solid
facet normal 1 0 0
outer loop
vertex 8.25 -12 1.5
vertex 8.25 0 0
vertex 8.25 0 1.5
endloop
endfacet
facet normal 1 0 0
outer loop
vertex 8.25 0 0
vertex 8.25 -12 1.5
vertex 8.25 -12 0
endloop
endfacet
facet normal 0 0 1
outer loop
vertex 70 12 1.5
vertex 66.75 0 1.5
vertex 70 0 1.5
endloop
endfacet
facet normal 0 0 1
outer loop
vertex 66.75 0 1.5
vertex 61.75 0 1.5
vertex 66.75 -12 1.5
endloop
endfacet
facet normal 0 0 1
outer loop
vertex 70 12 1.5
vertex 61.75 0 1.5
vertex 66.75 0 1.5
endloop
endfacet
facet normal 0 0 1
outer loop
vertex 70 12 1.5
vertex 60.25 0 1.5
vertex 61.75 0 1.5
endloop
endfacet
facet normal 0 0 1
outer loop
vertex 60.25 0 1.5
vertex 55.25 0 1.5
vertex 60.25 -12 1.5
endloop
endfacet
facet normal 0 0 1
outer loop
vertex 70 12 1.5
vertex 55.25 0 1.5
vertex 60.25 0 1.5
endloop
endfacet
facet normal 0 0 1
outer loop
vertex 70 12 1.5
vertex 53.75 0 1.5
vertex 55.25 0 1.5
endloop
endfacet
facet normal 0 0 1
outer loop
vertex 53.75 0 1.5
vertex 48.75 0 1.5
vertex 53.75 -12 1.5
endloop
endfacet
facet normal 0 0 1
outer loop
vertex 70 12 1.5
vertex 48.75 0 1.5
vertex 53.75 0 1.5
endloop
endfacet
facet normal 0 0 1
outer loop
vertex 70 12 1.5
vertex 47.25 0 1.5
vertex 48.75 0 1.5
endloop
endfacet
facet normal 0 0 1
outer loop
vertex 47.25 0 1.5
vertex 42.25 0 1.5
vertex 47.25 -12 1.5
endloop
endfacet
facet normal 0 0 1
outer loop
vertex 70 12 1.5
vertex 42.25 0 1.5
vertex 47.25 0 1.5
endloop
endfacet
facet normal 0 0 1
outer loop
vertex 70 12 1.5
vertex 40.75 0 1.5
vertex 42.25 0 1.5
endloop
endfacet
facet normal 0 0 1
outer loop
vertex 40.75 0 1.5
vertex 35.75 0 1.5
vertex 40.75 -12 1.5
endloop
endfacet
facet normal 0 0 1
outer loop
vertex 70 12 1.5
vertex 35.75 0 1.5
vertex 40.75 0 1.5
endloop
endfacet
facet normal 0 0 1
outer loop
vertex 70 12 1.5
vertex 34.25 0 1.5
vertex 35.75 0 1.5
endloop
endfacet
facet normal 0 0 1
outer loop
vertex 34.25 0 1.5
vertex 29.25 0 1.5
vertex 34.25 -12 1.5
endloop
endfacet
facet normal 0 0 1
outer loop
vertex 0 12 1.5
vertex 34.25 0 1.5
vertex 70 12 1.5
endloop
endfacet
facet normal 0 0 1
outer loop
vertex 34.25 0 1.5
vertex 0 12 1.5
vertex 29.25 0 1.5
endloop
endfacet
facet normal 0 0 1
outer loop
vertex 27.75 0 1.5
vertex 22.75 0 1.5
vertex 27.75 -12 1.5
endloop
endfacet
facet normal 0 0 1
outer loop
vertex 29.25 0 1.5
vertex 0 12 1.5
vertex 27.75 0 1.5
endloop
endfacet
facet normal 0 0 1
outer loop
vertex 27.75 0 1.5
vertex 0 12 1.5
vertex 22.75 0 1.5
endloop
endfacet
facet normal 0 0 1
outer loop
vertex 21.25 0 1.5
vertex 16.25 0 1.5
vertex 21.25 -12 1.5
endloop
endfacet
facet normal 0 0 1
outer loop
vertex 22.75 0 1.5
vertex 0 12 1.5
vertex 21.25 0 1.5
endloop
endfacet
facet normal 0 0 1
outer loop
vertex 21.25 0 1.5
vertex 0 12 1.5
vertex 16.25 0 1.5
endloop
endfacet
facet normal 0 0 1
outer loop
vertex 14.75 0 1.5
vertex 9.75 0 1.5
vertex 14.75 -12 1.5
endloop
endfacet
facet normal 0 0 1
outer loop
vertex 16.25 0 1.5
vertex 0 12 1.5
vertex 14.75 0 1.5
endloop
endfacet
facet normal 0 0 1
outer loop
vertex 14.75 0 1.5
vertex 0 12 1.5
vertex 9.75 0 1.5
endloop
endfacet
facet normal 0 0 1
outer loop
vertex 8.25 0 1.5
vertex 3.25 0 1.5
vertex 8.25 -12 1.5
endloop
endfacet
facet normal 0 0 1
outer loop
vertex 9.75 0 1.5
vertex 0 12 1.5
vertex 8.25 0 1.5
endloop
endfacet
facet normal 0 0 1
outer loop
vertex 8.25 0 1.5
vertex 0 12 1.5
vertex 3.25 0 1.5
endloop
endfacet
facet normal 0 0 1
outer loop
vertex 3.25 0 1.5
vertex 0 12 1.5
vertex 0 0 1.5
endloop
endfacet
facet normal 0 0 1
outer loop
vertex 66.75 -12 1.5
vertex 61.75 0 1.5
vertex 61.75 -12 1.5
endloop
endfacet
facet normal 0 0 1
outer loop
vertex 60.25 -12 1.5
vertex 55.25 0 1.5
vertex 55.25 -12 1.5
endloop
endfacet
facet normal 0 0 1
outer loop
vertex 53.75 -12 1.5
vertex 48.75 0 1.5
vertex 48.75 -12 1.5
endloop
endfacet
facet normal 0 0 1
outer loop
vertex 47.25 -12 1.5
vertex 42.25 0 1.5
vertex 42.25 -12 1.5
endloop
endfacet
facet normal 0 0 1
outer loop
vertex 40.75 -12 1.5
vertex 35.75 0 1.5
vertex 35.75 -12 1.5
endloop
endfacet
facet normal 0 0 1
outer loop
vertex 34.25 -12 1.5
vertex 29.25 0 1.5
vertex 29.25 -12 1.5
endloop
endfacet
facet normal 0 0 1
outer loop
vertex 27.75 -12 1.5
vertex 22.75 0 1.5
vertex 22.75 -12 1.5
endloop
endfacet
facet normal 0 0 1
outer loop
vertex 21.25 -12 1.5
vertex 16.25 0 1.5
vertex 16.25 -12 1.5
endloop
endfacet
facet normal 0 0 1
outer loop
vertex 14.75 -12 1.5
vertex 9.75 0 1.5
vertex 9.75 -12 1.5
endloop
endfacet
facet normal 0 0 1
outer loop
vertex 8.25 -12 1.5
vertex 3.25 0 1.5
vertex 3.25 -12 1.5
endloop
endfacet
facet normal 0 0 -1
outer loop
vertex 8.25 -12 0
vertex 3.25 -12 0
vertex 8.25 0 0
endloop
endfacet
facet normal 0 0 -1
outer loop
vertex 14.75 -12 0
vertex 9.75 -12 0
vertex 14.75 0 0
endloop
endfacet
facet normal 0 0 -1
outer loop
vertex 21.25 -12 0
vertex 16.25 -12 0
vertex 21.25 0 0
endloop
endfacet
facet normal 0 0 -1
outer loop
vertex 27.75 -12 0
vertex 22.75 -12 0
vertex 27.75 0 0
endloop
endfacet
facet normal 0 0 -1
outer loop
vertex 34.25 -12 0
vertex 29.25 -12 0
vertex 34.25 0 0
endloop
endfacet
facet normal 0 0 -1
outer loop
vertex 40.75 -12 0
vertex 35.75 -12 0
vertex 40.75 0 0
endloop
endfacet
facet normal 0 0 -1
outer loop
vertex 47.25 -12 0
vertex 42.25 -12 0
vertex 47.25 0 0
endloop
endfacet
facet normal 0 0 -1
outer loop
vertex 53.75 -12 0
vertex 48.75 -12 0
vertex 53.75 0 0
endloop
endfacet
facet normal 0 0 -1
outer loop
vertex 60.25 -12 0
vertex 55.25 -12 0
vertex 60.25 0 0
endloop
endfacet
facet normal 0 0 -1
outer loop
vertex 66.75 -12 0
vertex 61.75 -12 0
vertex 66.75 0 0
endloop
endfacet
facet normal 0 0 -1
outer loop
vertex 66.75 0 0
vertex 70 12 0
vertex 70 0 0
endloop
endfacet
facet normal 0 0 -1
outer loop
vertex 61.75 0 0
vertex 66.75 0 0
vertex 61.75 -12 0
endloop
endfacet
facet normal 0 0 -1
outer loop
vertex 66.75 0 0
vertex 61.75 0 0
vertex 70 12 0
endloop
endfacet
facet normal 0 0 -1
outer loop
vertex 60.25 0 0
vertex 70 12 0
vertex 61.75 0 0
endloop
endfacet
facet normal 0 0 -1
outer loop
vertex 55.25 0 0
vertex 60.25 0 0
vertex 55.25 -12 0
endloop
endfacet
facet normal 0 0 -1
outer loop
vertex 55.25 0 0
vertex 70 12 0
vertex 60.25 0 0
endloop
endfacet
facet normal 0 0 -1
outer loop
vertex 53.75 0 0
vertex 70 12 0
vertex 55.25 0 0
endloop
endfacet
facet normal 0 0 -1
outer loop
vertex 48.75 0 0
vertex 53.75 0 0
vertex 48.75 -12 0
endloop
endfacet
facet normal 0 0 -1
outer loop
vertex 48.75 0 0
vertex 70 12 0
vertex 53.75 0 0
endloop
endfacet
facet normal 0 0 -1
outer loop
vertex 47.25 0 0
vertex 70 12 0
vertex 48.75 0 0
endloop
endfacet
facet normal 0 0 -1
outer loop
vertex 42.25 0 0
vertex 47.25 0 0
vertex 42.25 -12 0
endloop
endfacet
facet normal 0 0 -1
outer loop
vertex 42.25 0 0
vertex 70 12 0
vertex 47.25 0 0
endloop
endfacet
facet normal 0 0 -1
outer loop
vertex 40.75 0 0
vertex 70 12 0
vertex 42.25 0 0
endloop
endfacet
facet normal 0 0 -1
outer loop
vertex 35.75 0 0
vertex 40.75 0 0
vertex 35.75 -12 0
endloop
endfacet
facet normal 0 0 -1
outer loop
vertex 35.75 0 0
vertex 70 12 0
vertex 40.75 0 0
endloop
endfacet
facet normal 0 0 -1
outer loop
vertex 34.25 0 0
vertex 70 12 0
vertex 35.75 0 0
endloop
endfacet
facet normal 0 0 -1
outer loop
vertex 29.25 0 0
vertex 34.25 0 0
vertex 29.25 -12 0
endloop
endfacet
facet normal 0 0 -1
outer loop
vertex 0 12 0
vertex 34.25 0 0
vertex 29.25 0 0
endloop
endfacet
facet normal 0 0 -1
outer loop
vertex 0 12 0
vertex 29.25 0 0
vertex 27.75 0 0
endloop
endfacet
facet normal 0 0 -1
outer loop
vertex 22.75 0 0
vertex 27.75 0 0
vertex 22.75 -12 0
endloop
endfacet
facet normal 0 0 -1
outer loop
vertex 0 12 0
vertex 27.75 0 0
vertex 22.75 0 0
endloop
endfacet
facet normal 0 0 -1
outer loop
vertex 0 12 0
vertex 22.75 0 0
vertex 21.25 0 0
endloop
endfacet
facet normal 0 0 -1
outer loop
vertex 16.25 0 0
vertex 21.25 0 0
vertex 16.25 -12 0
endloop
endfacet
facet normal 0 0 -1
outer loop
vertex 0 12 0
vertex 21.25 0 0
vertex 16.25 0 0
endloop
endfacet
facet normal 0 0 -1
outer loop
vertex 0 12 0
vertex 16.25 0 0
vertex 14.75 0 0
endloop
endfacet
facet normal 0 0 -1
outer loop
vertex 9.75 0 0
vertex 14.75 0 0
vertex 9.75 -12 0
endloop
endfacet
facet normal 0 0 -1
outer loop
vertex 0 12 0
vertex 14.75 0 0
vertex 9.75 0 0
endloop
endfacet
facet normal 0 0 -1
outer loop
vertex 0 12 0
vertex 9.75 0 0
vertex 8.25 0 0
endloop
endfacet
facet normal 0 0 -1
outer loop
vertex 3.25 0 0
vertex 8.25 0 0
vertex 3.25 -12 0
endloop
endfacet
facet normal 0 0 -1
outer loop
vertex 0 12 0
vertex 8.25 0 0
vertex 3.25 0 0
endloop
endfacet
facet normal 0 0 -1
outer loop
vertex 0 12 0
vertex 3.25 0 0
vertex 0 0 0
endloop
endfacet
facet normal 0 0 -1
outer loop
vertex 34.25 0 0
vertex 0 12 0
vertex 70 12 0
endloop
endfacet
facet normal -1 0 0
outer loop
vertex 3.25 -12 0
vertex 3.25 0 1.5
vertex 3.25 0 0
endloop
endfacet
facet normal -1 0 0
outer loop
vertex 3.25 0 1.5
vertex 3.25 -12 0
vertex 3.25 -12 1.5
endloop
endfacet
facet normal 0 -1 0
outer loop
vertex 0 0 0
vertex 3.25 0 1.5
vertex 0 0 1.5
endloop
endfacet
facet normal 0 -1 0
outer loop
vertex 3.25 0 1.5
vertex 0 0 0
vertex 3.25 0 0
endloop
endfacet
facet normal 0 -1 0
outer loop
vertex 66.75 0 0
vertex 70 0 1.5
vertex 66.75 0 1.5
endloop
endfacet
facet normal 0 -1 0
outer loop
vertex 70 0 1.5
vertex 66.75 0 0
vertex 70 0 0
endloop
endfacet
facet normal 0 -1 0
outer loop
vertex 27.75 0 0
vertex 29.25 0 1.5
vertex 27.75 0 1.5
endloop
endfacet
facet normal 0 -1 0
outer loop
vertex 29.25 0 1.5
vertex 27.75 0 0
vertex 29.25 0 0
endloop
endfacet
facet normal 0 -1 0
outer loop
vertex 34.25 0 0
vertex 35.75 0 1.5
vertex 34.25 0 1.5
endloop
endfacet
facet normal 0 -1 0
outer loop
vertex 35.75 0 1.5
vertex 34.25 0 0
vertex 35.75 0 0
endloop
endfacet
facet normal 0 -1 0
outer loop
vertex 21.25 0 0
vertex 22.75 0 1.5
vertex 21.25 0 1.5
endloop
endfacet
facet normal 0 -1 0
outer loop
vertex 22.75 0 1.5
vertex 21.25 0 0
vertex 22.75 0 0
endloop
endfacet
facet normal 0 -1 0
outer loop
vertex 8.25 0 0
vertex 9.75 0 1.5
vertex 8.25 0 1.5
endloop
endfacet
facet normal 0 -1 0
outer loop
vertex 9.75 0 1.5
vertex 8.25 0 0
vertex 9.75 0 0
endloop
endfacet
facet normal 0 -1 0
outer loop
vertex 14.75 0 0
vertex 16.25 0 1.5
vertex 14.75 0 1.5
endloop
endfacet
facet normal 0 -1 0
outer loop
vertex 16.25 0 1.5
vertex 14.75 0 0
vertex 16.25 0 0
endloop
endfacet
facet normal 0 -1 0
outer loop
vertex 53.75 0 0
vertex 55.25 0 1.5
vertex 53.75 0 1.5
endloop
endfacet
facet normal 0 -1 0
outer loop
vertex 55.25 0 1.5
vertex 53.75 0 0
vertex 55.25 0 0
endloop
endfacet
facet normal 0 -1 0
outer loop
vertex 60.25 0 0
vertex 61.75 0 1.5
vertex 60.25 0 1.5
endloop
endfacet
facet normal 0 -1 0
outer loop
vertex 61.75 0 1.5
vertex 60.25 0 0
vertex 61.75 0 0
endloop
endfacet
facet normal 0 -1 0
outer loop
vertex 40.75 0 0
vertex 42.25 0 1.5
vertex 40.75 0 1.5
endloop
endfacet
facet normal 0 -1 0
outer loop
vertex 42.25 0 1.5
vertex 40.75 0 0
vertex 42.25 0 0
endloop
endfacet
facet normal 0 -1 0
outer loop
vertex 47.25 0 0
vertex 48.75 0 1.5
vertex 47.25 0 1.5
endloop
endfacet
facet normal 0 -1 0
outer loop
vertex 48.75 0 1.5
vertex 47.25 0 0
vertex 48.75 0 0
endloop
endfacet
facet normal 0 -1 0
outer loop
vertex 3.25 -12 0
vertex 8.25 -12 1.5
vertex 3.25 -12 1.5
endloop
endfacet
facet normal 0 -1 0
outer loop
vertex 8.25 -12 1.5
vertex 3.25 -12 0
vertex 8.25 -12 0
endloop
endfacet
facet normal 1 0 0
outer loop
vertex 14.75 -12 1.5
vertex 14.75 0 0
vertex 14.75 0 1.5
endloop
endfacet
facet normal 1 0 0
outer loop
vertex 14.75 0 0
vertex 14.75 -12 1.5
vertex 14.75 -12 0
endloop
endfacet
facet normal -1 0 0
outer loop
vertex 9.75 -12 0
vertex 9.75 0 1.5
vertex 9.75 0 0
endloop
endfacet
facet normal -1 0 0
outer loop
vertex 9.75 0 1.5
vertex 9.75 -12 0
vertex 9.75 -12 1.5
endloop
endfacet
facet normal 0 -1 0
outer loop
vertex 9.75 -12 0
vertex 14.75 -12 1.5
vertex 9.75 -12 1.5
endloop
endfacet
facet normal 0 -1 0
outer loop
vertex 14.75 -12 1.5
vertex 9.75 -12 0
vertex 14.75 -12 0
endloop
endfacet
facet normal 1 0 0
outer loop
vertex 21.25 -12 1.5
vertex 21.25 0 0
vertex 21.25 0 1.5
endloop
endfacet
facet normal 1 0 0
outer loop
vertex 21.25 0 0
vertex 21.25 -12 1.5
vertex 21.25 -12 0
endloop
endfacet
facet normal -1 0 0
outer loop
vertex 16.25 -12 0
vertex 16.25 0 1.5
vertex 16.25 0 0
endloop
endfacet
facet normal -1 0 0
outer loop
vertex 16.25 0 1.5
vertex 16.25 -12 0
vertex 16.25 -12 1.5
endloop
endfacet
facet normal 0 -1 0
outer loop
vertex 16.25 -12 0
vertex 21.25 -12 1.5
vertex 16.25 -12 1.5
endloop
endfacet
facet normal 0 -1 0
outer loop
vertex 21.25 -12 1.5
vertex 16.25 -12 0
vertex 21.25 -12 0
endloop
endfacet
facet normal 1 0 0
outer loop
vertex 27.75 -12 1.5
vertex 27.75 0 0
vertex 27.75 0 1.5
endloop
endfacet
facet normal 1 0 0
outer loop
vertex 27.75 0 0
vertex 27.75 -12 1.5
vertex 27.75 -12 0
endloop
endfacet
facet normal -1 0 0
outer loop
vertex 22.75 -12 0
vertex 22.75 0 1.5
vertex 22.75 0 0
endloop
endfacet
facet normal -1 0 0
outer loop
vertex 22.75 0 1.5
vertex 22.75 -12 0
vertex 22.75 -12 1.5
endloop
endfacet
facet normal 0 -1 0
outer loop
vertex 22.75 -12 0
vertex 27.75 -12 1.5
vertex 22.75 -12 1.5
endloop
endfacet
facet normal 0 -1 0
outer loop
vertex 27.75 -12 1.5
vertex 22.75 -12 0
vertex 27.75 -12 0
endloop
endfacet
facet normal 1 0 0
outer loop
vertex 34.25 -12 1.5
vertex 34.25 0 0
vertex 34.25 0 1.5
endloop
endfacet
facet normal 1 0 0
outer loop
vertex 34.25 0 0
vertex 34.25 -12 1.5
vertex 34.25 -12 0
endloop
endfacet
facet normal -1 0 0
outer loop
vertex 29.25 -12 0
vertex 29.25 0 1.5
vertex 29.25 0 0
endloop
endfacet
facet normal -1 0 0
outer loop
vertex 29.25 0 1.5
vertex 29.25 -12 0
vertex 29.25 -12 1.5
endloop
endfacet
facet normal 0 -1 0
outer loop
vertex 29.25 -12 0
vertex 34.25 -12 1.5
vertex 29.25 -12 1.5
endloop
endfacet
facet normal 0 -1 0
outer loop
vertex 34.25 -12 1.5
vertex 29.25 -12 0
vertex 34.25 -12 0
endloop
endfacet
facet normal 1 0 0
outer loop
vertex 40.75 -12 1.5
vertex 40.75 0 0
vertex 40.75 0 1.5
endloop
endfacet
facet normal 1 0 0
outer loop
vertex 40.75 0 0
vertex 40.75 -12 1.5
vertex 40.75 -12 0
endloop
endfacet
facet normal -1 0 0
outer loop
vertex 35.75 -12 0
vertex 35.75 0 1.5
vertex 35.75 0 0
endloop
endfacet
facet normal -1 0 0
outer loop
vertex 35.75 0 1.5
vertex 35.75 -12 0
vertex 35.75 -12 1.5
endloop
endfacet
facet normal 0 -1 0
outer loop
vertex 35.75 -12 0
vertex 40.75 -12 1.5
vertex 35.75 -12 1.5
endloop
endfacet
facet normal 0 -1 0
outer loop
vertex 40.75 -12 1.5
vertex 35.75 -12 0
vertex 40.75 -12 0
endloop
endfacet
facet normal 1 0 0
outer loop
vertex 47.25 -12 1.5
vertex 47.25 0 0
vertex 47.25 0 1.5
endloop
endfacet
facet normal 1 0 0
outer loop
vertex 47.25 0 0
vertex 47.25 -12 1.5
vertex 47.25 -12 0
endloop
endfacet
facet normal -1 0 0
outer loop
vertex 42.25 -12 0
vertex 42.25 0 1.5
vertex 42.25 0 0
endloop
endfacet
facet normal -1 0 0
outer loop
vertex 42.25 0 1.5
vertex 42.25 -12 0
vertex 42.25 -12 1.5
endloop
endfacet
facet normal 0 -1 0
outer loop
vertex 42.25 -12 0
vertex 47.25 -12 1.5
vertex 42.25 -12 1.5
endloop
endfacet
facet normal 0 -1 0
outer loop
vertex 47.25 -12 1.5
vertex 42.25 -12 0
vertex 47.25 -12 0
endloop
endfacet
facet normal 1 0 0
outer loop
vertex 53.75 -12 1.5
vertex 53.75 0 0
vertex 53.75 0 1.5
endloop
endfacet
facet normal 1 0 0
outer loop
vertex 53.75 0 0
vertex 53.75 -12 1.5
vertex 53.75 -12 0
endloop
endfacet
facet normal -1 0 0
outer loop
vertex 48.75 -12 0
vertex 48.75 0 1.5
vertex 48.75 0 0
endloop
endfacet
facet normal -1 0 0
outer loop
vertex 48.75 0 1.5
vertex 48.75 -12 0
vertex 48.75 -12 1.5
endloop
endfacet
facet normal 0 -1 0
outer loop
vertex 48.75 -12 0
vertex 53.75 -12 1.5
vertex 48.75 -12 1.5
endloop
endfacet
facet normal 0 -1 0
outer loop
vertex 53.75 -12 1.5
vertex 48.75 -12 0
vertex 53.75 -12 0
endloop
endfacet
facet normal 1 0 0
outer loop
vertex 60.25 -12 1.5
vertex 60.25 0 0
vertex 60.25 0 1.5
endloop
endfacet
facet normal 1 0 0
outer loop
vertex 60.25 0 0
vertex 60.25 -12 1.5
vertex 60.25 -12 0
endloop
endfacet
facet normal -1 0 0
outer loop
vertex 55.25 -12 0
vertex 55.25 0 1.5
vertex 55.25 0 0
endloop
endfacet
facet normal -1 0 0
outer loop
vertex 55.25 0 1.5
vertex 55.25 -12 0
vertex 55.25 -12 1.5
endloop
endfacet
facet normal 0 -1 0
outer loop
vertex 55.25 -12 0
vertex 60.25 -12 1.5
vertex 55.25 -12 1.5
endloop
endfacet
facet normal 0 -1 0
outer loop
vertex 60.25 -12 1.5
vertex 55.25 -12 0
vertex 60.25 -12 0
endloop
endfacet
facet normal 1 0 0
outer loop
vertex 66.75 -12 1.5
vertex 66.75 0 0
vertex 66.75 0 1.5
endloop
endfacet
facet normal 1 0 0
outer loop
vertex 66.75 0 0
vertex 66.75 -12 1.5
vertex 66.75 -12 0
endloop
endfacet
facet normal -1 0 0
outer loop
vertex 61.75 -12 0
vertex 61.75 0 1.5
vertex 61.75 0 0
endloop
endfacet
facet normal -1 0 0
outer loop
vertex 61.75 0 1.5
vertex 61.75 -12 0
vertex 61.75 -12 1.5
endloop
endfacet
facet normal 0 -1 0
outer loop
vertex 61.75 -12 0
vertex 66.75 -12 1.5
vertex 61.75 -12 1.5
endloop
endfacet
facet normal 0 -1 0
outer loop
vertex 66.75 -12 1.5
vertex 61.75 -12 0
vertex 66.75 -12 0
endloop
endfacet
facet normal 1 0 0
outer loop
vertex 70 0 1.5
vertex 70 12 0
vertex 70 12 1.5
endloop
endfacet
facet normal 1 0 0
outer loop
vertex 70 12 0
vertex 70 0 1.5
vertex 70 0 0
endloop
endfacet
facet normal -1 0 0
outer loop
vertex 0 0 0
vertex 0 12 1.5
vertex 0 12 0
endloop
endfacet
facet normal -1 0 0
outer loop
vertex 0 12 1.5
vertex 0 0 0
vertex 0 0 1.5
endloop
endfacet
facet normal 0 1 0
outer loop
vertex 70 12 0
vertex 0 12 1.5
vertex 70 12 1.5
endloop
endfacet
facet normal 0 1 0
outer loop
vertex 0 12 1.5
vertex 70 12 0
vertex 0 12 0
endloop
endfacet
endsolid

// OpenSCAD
// 10-well comb for casting agarose gels
// Print orientation: lying flat on XY plane, z=0

// Overall plate thickness
plate_thickness = 1.5;

// Spine (back bar) dimensions
spine_length = 70;    // X direction
spine_width = 12;     // Y direction

// Tooth dimensions
tooth_width = 5.0;    // X direction
tooth_length = 12;    // Y direction (extends in -Y from spine)

// Gap between teeth
gap_width = 1.5;

// Number of teeth
num_teeth = 10;

// Calculate total width of teeth + gaps
total_tooth_width = num_teeth * tooth_width;
total_gap_width = (num_teeth - 1) * gap_width;
total_pattern_width = total_tooth_width + total_gap_width;

// Center offset to align pattern with spine center
pattern_offset_x = (spine_length - total_pattern_width) / 2;

// Build the comb as a single solid
union() {
    // Spine (back bar) - positioned at y=0 to y=spine_width
    translate([0, 0, 0])
        cube([spine_length, spine_width, plate_thickness]);
    
    // Teeth - extend from y=0 in -Y direction
    for (i = [0 : num_teeth - 1]) {
        x_pos = pattern_offset_x + i * (tooth_width + gap_width);
        translate([x_pos, -tooth_length, 0])
            cube([tooth_width, tooth_length, plate_thickness]);
    }
}
